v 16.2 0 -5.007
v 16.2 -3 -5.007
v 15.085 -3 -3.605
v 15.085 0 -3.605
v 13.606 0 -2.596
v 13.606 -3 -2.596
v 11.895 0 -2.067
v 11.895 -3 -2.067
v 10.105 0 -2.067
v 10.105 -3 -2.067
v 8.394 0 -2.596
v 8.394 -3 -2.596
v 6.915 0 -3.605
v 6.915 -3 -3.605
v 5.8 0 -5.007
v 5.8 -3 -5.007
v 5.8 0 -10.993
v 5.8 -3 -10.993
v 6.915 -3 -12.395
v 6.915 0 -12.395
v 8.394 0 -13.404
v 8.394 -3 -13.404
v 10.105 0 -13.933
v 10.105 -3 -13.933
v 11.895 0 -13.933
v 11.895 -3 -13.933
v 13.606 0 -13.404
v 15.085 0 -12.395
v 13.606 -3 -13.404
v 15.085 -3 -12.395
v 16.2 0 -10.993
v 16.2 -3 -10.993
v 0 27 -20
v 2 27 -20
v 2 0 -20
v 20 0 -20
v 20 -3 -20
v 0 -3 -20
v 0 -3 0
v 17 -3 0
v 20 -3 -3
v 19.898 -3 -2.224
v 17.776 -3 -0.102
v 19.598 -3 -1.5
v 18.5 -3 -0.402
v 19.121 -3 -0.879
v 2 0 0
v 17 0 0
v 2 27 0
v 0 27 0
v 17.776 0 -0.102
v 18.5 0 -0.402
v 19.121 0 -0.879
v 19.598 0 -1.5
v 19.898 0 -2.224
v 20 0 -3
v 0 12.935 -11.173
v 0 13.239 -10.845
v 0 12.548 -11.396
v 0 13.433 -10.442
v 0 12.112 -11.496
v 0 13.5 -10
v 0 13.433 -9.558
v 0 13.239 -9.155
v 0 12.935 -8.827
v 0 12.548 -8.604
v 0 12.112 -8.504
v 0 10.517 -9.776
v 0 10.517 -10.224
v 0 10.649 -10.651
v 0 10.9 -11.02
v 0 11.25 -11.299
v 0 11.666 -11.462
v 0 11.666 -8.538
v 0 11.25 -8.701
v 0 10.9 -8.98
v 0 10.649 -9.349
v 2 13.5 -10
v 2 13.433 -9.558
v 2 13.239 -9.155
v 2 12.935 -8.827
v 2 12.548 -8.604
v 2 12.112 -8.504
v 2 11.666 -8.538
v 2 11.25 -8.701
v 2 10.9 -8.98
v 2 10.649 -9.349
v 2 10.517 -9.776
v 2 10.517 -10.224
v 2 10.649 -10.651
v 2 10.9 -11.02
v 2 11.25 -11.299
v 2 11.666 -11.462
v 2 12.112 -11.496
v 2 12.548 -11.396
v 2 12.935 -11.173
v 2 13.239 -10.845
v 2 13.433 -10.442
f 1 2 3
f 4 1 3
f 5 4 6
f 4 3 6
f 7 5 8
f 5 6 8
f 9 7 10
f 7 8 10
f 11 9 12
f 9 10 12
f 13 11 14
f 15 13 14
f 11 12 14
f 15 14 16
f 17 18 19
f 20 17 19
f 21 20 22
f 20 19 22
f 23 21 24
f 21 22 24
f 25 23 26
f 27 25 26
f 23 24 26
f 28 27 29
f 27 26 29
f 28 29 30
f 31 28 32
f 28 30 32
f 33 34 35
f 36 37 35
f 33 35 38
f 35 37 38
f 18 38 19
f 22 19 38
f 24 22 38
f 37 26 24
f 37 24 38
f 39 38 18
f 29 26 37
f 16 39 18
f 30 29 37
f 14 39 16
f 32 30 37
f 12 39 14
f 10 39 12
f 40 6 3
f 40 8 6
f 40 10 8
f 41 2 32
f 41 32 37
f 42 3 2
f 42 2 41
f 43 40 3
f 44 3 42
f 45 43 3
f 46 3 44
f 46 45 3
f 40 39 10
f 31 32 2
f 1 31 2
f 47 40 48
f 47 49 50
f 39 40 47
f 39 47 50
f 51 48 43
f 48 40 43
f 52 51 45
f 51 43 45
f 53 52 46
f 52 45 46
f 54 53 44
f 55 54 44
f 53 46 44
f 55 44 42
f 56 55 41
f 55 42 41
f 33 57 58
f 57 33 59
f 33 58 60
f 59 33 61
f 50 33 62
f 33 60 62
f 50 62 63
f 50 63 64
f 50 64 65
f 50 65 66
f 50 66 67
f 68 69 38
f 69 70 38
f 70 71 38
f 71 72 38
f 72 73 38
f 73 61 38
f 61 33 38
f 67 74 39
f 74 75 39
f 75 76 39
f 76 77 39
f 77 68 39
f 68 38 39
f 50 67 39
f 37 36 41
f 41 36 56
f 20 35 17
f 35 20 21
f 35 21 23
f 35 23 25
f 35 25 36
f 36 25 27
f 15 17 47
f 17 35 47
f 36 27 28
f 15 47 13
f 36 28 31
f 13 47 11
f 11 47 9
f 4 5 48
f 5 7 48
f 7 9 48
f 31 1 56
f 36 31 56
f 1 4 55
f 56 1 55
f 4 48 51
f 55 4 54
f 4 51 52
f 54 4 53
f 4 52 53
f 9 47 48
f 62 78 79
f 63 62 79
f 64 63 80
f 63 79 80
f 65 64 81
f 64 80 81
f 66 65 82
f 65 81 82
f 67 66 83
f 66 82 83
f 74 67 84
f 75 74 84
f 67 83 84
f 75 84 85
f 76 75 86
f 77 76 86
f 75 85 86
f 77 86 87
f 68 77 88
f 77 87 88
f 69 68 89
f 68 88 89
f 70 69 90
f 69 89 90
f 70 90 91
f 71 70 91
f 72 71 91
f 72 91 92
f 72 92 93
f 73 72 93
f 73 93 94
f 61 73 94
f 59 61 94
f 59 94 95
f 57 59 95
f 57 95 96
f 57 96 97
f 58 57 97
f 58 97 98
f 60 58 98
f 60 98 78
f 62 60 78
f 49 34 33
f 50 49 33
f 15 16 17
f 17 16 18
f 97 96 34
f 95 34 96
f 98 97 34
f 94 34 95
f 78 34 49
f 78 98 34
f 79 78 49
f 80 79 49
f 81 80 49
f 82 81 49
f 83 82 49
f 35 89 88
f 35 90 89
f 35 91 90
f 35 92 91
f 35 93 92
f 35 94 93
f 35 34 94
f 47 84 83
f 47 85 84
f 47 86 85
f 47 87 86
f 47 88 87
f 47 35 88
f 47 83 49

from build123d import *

# Parameters (mm, degrees)
F0_W     = 20
F0_H     = 20
F1_DEPTH = 3
F2_W     = 2
F2_H     = 20
F3_DEPTH = 27
F5_DEPTH = 25
F6_R     = 1.5
F7_DEPTH = 25
F8_R     = 3


with BuildPart() as f1:
    # F0 (on Front) → F1 (new body)
    with BuildSketch(Plane.XZ):
        with Locations((10, -10)):
            Rectangle(F0_W, F0_H)
    extrude(amount=F1_DEPTH)

    # F2 (on face) → F3 (join)
    with BuildSketch(Plane(origin=(0, 0, 0), x_dir=(-1, 0, 0), z_dir=(0, 1, 0))):
        with Locations((-1, -10)):
            Rectangle(F2_W, F2_H)
    extrude(amount=F3_DEPTH)

    # F4 (on face) → F5 (cut)
    with BuildSketch(Plane.XZ.offset(3)):
        with BuildLine():
            Line((5.8, -5.006674), (5.8, -10.993326))
            ThreePointArc((5.8, -10.993326), (11, -14), (16.2, -10.993326))
            Line((16.2, -10.993326), (16.2, -5.006674))
            ThreePointArc((16.2, -5.006674), (11, -2), (5.8, -5.006674))
        make_face()
    extrude(amount=-F5_DEPTH, mode=Mode.SUBTRACT)

    # F6 (on face) → F7 (cut)
    with BuildSketch(Plane.YZ.offset(2)):
        with Locations((12, -10)):
            Circle(F6_R)
    extrude(amount=-F7_DEPTH, mode=Mode.SUBTRACT)

    # F8
    f8_edges = [f1.edges().sort_by_distance(p)[0] for p in [
        (20, -1.5, 0),
    ]]
    fillet(f8_edges, radius=F8_R)


solid = f1.part
